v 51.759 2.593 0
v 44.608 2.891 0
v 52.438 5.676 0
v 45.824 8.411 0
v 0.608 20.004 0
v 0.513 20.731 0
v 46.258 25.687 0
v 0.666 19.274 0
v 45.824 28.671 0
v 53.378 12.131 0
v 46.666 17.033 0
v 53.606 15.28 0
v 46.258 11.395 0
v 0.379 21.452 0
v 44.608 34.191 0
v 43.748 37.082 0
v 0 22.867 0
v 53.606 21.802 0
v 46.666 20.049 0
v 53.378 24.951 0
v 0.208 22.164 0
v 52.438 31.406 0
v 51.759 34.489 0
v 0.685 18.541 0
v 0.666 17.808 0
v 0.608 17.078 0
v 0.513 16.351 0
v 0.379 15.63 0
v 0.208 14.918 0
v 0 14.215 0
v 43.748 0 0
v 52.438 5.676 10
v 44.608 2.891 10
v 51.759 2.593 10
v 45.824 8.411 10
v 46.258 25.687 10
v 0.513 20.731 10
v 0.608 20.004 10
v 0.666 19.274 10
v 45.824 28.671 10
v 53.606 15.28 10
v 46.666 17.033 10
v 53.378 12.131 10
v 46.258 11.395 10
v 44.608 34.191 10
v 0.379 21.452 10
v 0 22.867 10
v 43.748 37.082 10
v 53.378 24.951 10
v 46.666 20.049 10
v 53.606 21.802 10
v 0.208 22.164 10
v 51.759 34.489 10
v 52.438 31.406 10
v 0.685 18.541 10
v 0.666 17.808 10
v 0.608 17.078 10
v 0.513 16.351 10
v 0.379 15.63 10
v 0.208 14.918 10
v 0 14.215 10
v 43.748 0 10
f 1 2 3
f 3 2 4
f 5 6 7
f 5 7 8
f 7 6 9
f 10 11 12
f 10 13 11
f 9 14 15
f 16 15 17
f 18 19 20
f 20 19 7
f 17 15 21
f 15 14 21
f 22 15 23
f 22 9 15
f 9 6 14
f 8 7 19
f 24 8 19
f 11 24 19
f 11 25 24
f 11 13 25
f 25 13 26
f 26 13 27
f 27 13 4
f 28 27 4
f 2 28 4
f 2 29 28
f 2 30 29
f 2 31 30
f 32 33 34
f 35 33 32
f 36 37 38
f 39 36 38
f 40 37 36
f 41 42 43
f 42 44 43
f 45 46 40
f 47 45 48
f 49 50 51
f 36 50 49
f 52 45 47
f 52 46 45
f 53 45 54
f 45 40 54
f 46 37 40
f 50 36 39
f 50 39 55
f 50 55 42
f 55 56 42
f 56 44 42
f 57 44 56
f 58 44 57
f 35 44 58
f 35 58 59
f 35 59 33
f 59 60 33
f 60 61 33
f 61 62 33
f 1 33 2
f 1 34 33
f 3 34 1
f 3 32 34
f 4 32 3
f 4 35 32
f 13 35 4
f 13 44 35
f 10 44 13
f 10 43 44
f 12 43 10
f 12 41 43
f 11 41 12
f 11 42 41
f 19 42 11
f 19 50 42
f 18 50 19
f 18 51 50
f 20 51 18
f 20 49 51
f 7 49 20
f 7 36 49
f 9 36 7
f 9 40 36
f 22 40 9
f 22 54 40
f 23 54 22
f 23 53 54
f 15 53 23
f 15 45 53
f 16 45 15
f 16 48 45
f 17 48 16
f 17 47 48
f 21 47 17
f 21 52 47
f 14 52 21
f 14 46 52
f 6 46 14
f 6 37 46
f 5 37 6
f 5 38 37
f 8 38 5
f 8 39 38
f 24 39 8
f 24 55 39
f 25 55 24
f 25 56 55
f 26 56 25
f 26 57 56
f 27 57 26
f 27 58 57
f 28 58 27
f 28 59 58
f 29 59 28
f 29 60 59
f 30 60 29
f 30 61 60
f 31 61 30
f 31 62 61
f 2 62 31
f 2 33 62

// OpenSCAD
$fn = 32;

// ----------------------------------------------------------------------
// Gear sector: 4 teeth on 36 degrees
// ----------------------------------------------------------------------

// --- parameters (mm) ---
sector_angle = 36;        // sector angle, degrees
root_r = 60;              // root circle radius
tooth_h = 7;              // tooth height over the root circle
teeth = 4;                // number of teeth on the sector
hub_r = 14;               // hub bore radius
plate_t = 10;             // sector thickness, Z
arc_step = 3;             // sampling step of the root/hub arcs, degrees

tip_r = root_r + tooth_h;  // tip circle radius

profile = [[43.748, 0], [44.608, 2.891], [51.759, 2.593], [52.438, 5.676], [45.824, 8.411], [46.258, 11.395], [53.378, 12.131], [53.606, 15.28], [46.666, 17.033], [46.666, 20.049], [53.606, 21.802], [53.378, 24.951], [46.258, 25.687], [45.824, 28.671], [52.438, 31.406], [51.759, 34.489], [44.608, 34.191], [43.748, 37.082], [0, 22.867], [0.208, 22.164], [0.379, 21.452], [0.513, 20.731], [0.608, 20.004], [0.666, 19.274], [0.685, 18.541], [0.666, 17.808], [0.608, 17.078], [0.513, 16.351], [0.379, 15.63], [0.208, 14.918], [0, 14.215]];  // primary outline, 31 points, counter clockwise

// --- the one profile operation ---
linear_extrude(height = plate_t) polygon(points = profile);
